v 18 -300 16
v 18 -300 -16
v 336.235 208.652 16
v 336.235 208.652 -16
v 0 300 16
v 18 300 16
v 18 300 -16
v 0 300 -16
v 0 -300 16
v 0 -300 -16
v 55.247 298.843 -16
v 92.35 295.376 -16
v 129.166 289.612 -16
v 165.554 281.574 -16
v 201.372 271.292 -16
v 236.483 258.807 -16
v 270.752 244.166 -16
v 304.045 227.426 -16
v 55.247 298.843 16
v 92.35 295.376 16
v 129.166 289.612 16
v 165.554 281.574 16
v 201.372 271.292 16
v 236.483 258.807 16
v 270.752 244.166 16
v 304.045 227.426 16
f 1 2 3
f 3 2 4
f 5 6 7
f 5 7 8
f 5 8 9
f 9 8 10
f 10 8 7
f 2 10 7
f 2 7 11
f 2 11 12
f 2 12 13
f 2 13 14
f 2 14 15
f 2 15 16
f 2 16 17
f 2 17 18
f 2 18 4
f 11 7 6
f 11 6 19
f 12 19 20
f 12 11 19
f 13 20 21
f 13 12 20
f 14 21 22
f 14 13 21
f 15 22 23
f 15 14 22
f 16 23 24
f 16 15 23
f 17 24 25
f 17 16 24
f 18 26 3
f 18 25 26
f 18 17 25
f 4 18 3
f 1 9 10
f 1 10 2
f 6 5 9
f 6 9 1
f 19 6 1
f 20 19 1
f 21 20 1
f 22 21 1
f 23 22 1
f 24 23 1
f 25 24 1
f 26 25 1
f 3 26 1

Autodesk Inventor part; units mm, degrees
ref_plane "YZ Plane" through (0, 0, 0) normal (1, 0, 0) x (0, 1, 0)
ref_plane "XZ Plane" through (0, 0, 0) normal (0, 1, 0) x (-1, 0, 0)
ref_plane "XY Plane" through (0, 0, 0) normal (0, 0, 1) x (1, 0, 0)
sketch "Эскиз1" plane through (0, 0, 0) normal (0, 0, 1) x (1, 0, 0)
  line L0 (0, -300) -> (18, -300)
  line L1 (18, 300) -> (0, 300)
  line L2 (0, 300) -> (0, -300)
  arc A0 (336.2347, 208.6518) -> (18, 300) centre (18, -300) ccw
  line L3 (18, -300) -> (336.2347, 208.6518)
  point P0 (0, 0)
  dimension "d0" = 600
  dimension "d1" = 18
  dimension "d5" = 18
extrude "Выдавливание1" add sketch "Эскиз1" along normal mid plane 32
properties part number "Веер хвоста (сложенный)"
